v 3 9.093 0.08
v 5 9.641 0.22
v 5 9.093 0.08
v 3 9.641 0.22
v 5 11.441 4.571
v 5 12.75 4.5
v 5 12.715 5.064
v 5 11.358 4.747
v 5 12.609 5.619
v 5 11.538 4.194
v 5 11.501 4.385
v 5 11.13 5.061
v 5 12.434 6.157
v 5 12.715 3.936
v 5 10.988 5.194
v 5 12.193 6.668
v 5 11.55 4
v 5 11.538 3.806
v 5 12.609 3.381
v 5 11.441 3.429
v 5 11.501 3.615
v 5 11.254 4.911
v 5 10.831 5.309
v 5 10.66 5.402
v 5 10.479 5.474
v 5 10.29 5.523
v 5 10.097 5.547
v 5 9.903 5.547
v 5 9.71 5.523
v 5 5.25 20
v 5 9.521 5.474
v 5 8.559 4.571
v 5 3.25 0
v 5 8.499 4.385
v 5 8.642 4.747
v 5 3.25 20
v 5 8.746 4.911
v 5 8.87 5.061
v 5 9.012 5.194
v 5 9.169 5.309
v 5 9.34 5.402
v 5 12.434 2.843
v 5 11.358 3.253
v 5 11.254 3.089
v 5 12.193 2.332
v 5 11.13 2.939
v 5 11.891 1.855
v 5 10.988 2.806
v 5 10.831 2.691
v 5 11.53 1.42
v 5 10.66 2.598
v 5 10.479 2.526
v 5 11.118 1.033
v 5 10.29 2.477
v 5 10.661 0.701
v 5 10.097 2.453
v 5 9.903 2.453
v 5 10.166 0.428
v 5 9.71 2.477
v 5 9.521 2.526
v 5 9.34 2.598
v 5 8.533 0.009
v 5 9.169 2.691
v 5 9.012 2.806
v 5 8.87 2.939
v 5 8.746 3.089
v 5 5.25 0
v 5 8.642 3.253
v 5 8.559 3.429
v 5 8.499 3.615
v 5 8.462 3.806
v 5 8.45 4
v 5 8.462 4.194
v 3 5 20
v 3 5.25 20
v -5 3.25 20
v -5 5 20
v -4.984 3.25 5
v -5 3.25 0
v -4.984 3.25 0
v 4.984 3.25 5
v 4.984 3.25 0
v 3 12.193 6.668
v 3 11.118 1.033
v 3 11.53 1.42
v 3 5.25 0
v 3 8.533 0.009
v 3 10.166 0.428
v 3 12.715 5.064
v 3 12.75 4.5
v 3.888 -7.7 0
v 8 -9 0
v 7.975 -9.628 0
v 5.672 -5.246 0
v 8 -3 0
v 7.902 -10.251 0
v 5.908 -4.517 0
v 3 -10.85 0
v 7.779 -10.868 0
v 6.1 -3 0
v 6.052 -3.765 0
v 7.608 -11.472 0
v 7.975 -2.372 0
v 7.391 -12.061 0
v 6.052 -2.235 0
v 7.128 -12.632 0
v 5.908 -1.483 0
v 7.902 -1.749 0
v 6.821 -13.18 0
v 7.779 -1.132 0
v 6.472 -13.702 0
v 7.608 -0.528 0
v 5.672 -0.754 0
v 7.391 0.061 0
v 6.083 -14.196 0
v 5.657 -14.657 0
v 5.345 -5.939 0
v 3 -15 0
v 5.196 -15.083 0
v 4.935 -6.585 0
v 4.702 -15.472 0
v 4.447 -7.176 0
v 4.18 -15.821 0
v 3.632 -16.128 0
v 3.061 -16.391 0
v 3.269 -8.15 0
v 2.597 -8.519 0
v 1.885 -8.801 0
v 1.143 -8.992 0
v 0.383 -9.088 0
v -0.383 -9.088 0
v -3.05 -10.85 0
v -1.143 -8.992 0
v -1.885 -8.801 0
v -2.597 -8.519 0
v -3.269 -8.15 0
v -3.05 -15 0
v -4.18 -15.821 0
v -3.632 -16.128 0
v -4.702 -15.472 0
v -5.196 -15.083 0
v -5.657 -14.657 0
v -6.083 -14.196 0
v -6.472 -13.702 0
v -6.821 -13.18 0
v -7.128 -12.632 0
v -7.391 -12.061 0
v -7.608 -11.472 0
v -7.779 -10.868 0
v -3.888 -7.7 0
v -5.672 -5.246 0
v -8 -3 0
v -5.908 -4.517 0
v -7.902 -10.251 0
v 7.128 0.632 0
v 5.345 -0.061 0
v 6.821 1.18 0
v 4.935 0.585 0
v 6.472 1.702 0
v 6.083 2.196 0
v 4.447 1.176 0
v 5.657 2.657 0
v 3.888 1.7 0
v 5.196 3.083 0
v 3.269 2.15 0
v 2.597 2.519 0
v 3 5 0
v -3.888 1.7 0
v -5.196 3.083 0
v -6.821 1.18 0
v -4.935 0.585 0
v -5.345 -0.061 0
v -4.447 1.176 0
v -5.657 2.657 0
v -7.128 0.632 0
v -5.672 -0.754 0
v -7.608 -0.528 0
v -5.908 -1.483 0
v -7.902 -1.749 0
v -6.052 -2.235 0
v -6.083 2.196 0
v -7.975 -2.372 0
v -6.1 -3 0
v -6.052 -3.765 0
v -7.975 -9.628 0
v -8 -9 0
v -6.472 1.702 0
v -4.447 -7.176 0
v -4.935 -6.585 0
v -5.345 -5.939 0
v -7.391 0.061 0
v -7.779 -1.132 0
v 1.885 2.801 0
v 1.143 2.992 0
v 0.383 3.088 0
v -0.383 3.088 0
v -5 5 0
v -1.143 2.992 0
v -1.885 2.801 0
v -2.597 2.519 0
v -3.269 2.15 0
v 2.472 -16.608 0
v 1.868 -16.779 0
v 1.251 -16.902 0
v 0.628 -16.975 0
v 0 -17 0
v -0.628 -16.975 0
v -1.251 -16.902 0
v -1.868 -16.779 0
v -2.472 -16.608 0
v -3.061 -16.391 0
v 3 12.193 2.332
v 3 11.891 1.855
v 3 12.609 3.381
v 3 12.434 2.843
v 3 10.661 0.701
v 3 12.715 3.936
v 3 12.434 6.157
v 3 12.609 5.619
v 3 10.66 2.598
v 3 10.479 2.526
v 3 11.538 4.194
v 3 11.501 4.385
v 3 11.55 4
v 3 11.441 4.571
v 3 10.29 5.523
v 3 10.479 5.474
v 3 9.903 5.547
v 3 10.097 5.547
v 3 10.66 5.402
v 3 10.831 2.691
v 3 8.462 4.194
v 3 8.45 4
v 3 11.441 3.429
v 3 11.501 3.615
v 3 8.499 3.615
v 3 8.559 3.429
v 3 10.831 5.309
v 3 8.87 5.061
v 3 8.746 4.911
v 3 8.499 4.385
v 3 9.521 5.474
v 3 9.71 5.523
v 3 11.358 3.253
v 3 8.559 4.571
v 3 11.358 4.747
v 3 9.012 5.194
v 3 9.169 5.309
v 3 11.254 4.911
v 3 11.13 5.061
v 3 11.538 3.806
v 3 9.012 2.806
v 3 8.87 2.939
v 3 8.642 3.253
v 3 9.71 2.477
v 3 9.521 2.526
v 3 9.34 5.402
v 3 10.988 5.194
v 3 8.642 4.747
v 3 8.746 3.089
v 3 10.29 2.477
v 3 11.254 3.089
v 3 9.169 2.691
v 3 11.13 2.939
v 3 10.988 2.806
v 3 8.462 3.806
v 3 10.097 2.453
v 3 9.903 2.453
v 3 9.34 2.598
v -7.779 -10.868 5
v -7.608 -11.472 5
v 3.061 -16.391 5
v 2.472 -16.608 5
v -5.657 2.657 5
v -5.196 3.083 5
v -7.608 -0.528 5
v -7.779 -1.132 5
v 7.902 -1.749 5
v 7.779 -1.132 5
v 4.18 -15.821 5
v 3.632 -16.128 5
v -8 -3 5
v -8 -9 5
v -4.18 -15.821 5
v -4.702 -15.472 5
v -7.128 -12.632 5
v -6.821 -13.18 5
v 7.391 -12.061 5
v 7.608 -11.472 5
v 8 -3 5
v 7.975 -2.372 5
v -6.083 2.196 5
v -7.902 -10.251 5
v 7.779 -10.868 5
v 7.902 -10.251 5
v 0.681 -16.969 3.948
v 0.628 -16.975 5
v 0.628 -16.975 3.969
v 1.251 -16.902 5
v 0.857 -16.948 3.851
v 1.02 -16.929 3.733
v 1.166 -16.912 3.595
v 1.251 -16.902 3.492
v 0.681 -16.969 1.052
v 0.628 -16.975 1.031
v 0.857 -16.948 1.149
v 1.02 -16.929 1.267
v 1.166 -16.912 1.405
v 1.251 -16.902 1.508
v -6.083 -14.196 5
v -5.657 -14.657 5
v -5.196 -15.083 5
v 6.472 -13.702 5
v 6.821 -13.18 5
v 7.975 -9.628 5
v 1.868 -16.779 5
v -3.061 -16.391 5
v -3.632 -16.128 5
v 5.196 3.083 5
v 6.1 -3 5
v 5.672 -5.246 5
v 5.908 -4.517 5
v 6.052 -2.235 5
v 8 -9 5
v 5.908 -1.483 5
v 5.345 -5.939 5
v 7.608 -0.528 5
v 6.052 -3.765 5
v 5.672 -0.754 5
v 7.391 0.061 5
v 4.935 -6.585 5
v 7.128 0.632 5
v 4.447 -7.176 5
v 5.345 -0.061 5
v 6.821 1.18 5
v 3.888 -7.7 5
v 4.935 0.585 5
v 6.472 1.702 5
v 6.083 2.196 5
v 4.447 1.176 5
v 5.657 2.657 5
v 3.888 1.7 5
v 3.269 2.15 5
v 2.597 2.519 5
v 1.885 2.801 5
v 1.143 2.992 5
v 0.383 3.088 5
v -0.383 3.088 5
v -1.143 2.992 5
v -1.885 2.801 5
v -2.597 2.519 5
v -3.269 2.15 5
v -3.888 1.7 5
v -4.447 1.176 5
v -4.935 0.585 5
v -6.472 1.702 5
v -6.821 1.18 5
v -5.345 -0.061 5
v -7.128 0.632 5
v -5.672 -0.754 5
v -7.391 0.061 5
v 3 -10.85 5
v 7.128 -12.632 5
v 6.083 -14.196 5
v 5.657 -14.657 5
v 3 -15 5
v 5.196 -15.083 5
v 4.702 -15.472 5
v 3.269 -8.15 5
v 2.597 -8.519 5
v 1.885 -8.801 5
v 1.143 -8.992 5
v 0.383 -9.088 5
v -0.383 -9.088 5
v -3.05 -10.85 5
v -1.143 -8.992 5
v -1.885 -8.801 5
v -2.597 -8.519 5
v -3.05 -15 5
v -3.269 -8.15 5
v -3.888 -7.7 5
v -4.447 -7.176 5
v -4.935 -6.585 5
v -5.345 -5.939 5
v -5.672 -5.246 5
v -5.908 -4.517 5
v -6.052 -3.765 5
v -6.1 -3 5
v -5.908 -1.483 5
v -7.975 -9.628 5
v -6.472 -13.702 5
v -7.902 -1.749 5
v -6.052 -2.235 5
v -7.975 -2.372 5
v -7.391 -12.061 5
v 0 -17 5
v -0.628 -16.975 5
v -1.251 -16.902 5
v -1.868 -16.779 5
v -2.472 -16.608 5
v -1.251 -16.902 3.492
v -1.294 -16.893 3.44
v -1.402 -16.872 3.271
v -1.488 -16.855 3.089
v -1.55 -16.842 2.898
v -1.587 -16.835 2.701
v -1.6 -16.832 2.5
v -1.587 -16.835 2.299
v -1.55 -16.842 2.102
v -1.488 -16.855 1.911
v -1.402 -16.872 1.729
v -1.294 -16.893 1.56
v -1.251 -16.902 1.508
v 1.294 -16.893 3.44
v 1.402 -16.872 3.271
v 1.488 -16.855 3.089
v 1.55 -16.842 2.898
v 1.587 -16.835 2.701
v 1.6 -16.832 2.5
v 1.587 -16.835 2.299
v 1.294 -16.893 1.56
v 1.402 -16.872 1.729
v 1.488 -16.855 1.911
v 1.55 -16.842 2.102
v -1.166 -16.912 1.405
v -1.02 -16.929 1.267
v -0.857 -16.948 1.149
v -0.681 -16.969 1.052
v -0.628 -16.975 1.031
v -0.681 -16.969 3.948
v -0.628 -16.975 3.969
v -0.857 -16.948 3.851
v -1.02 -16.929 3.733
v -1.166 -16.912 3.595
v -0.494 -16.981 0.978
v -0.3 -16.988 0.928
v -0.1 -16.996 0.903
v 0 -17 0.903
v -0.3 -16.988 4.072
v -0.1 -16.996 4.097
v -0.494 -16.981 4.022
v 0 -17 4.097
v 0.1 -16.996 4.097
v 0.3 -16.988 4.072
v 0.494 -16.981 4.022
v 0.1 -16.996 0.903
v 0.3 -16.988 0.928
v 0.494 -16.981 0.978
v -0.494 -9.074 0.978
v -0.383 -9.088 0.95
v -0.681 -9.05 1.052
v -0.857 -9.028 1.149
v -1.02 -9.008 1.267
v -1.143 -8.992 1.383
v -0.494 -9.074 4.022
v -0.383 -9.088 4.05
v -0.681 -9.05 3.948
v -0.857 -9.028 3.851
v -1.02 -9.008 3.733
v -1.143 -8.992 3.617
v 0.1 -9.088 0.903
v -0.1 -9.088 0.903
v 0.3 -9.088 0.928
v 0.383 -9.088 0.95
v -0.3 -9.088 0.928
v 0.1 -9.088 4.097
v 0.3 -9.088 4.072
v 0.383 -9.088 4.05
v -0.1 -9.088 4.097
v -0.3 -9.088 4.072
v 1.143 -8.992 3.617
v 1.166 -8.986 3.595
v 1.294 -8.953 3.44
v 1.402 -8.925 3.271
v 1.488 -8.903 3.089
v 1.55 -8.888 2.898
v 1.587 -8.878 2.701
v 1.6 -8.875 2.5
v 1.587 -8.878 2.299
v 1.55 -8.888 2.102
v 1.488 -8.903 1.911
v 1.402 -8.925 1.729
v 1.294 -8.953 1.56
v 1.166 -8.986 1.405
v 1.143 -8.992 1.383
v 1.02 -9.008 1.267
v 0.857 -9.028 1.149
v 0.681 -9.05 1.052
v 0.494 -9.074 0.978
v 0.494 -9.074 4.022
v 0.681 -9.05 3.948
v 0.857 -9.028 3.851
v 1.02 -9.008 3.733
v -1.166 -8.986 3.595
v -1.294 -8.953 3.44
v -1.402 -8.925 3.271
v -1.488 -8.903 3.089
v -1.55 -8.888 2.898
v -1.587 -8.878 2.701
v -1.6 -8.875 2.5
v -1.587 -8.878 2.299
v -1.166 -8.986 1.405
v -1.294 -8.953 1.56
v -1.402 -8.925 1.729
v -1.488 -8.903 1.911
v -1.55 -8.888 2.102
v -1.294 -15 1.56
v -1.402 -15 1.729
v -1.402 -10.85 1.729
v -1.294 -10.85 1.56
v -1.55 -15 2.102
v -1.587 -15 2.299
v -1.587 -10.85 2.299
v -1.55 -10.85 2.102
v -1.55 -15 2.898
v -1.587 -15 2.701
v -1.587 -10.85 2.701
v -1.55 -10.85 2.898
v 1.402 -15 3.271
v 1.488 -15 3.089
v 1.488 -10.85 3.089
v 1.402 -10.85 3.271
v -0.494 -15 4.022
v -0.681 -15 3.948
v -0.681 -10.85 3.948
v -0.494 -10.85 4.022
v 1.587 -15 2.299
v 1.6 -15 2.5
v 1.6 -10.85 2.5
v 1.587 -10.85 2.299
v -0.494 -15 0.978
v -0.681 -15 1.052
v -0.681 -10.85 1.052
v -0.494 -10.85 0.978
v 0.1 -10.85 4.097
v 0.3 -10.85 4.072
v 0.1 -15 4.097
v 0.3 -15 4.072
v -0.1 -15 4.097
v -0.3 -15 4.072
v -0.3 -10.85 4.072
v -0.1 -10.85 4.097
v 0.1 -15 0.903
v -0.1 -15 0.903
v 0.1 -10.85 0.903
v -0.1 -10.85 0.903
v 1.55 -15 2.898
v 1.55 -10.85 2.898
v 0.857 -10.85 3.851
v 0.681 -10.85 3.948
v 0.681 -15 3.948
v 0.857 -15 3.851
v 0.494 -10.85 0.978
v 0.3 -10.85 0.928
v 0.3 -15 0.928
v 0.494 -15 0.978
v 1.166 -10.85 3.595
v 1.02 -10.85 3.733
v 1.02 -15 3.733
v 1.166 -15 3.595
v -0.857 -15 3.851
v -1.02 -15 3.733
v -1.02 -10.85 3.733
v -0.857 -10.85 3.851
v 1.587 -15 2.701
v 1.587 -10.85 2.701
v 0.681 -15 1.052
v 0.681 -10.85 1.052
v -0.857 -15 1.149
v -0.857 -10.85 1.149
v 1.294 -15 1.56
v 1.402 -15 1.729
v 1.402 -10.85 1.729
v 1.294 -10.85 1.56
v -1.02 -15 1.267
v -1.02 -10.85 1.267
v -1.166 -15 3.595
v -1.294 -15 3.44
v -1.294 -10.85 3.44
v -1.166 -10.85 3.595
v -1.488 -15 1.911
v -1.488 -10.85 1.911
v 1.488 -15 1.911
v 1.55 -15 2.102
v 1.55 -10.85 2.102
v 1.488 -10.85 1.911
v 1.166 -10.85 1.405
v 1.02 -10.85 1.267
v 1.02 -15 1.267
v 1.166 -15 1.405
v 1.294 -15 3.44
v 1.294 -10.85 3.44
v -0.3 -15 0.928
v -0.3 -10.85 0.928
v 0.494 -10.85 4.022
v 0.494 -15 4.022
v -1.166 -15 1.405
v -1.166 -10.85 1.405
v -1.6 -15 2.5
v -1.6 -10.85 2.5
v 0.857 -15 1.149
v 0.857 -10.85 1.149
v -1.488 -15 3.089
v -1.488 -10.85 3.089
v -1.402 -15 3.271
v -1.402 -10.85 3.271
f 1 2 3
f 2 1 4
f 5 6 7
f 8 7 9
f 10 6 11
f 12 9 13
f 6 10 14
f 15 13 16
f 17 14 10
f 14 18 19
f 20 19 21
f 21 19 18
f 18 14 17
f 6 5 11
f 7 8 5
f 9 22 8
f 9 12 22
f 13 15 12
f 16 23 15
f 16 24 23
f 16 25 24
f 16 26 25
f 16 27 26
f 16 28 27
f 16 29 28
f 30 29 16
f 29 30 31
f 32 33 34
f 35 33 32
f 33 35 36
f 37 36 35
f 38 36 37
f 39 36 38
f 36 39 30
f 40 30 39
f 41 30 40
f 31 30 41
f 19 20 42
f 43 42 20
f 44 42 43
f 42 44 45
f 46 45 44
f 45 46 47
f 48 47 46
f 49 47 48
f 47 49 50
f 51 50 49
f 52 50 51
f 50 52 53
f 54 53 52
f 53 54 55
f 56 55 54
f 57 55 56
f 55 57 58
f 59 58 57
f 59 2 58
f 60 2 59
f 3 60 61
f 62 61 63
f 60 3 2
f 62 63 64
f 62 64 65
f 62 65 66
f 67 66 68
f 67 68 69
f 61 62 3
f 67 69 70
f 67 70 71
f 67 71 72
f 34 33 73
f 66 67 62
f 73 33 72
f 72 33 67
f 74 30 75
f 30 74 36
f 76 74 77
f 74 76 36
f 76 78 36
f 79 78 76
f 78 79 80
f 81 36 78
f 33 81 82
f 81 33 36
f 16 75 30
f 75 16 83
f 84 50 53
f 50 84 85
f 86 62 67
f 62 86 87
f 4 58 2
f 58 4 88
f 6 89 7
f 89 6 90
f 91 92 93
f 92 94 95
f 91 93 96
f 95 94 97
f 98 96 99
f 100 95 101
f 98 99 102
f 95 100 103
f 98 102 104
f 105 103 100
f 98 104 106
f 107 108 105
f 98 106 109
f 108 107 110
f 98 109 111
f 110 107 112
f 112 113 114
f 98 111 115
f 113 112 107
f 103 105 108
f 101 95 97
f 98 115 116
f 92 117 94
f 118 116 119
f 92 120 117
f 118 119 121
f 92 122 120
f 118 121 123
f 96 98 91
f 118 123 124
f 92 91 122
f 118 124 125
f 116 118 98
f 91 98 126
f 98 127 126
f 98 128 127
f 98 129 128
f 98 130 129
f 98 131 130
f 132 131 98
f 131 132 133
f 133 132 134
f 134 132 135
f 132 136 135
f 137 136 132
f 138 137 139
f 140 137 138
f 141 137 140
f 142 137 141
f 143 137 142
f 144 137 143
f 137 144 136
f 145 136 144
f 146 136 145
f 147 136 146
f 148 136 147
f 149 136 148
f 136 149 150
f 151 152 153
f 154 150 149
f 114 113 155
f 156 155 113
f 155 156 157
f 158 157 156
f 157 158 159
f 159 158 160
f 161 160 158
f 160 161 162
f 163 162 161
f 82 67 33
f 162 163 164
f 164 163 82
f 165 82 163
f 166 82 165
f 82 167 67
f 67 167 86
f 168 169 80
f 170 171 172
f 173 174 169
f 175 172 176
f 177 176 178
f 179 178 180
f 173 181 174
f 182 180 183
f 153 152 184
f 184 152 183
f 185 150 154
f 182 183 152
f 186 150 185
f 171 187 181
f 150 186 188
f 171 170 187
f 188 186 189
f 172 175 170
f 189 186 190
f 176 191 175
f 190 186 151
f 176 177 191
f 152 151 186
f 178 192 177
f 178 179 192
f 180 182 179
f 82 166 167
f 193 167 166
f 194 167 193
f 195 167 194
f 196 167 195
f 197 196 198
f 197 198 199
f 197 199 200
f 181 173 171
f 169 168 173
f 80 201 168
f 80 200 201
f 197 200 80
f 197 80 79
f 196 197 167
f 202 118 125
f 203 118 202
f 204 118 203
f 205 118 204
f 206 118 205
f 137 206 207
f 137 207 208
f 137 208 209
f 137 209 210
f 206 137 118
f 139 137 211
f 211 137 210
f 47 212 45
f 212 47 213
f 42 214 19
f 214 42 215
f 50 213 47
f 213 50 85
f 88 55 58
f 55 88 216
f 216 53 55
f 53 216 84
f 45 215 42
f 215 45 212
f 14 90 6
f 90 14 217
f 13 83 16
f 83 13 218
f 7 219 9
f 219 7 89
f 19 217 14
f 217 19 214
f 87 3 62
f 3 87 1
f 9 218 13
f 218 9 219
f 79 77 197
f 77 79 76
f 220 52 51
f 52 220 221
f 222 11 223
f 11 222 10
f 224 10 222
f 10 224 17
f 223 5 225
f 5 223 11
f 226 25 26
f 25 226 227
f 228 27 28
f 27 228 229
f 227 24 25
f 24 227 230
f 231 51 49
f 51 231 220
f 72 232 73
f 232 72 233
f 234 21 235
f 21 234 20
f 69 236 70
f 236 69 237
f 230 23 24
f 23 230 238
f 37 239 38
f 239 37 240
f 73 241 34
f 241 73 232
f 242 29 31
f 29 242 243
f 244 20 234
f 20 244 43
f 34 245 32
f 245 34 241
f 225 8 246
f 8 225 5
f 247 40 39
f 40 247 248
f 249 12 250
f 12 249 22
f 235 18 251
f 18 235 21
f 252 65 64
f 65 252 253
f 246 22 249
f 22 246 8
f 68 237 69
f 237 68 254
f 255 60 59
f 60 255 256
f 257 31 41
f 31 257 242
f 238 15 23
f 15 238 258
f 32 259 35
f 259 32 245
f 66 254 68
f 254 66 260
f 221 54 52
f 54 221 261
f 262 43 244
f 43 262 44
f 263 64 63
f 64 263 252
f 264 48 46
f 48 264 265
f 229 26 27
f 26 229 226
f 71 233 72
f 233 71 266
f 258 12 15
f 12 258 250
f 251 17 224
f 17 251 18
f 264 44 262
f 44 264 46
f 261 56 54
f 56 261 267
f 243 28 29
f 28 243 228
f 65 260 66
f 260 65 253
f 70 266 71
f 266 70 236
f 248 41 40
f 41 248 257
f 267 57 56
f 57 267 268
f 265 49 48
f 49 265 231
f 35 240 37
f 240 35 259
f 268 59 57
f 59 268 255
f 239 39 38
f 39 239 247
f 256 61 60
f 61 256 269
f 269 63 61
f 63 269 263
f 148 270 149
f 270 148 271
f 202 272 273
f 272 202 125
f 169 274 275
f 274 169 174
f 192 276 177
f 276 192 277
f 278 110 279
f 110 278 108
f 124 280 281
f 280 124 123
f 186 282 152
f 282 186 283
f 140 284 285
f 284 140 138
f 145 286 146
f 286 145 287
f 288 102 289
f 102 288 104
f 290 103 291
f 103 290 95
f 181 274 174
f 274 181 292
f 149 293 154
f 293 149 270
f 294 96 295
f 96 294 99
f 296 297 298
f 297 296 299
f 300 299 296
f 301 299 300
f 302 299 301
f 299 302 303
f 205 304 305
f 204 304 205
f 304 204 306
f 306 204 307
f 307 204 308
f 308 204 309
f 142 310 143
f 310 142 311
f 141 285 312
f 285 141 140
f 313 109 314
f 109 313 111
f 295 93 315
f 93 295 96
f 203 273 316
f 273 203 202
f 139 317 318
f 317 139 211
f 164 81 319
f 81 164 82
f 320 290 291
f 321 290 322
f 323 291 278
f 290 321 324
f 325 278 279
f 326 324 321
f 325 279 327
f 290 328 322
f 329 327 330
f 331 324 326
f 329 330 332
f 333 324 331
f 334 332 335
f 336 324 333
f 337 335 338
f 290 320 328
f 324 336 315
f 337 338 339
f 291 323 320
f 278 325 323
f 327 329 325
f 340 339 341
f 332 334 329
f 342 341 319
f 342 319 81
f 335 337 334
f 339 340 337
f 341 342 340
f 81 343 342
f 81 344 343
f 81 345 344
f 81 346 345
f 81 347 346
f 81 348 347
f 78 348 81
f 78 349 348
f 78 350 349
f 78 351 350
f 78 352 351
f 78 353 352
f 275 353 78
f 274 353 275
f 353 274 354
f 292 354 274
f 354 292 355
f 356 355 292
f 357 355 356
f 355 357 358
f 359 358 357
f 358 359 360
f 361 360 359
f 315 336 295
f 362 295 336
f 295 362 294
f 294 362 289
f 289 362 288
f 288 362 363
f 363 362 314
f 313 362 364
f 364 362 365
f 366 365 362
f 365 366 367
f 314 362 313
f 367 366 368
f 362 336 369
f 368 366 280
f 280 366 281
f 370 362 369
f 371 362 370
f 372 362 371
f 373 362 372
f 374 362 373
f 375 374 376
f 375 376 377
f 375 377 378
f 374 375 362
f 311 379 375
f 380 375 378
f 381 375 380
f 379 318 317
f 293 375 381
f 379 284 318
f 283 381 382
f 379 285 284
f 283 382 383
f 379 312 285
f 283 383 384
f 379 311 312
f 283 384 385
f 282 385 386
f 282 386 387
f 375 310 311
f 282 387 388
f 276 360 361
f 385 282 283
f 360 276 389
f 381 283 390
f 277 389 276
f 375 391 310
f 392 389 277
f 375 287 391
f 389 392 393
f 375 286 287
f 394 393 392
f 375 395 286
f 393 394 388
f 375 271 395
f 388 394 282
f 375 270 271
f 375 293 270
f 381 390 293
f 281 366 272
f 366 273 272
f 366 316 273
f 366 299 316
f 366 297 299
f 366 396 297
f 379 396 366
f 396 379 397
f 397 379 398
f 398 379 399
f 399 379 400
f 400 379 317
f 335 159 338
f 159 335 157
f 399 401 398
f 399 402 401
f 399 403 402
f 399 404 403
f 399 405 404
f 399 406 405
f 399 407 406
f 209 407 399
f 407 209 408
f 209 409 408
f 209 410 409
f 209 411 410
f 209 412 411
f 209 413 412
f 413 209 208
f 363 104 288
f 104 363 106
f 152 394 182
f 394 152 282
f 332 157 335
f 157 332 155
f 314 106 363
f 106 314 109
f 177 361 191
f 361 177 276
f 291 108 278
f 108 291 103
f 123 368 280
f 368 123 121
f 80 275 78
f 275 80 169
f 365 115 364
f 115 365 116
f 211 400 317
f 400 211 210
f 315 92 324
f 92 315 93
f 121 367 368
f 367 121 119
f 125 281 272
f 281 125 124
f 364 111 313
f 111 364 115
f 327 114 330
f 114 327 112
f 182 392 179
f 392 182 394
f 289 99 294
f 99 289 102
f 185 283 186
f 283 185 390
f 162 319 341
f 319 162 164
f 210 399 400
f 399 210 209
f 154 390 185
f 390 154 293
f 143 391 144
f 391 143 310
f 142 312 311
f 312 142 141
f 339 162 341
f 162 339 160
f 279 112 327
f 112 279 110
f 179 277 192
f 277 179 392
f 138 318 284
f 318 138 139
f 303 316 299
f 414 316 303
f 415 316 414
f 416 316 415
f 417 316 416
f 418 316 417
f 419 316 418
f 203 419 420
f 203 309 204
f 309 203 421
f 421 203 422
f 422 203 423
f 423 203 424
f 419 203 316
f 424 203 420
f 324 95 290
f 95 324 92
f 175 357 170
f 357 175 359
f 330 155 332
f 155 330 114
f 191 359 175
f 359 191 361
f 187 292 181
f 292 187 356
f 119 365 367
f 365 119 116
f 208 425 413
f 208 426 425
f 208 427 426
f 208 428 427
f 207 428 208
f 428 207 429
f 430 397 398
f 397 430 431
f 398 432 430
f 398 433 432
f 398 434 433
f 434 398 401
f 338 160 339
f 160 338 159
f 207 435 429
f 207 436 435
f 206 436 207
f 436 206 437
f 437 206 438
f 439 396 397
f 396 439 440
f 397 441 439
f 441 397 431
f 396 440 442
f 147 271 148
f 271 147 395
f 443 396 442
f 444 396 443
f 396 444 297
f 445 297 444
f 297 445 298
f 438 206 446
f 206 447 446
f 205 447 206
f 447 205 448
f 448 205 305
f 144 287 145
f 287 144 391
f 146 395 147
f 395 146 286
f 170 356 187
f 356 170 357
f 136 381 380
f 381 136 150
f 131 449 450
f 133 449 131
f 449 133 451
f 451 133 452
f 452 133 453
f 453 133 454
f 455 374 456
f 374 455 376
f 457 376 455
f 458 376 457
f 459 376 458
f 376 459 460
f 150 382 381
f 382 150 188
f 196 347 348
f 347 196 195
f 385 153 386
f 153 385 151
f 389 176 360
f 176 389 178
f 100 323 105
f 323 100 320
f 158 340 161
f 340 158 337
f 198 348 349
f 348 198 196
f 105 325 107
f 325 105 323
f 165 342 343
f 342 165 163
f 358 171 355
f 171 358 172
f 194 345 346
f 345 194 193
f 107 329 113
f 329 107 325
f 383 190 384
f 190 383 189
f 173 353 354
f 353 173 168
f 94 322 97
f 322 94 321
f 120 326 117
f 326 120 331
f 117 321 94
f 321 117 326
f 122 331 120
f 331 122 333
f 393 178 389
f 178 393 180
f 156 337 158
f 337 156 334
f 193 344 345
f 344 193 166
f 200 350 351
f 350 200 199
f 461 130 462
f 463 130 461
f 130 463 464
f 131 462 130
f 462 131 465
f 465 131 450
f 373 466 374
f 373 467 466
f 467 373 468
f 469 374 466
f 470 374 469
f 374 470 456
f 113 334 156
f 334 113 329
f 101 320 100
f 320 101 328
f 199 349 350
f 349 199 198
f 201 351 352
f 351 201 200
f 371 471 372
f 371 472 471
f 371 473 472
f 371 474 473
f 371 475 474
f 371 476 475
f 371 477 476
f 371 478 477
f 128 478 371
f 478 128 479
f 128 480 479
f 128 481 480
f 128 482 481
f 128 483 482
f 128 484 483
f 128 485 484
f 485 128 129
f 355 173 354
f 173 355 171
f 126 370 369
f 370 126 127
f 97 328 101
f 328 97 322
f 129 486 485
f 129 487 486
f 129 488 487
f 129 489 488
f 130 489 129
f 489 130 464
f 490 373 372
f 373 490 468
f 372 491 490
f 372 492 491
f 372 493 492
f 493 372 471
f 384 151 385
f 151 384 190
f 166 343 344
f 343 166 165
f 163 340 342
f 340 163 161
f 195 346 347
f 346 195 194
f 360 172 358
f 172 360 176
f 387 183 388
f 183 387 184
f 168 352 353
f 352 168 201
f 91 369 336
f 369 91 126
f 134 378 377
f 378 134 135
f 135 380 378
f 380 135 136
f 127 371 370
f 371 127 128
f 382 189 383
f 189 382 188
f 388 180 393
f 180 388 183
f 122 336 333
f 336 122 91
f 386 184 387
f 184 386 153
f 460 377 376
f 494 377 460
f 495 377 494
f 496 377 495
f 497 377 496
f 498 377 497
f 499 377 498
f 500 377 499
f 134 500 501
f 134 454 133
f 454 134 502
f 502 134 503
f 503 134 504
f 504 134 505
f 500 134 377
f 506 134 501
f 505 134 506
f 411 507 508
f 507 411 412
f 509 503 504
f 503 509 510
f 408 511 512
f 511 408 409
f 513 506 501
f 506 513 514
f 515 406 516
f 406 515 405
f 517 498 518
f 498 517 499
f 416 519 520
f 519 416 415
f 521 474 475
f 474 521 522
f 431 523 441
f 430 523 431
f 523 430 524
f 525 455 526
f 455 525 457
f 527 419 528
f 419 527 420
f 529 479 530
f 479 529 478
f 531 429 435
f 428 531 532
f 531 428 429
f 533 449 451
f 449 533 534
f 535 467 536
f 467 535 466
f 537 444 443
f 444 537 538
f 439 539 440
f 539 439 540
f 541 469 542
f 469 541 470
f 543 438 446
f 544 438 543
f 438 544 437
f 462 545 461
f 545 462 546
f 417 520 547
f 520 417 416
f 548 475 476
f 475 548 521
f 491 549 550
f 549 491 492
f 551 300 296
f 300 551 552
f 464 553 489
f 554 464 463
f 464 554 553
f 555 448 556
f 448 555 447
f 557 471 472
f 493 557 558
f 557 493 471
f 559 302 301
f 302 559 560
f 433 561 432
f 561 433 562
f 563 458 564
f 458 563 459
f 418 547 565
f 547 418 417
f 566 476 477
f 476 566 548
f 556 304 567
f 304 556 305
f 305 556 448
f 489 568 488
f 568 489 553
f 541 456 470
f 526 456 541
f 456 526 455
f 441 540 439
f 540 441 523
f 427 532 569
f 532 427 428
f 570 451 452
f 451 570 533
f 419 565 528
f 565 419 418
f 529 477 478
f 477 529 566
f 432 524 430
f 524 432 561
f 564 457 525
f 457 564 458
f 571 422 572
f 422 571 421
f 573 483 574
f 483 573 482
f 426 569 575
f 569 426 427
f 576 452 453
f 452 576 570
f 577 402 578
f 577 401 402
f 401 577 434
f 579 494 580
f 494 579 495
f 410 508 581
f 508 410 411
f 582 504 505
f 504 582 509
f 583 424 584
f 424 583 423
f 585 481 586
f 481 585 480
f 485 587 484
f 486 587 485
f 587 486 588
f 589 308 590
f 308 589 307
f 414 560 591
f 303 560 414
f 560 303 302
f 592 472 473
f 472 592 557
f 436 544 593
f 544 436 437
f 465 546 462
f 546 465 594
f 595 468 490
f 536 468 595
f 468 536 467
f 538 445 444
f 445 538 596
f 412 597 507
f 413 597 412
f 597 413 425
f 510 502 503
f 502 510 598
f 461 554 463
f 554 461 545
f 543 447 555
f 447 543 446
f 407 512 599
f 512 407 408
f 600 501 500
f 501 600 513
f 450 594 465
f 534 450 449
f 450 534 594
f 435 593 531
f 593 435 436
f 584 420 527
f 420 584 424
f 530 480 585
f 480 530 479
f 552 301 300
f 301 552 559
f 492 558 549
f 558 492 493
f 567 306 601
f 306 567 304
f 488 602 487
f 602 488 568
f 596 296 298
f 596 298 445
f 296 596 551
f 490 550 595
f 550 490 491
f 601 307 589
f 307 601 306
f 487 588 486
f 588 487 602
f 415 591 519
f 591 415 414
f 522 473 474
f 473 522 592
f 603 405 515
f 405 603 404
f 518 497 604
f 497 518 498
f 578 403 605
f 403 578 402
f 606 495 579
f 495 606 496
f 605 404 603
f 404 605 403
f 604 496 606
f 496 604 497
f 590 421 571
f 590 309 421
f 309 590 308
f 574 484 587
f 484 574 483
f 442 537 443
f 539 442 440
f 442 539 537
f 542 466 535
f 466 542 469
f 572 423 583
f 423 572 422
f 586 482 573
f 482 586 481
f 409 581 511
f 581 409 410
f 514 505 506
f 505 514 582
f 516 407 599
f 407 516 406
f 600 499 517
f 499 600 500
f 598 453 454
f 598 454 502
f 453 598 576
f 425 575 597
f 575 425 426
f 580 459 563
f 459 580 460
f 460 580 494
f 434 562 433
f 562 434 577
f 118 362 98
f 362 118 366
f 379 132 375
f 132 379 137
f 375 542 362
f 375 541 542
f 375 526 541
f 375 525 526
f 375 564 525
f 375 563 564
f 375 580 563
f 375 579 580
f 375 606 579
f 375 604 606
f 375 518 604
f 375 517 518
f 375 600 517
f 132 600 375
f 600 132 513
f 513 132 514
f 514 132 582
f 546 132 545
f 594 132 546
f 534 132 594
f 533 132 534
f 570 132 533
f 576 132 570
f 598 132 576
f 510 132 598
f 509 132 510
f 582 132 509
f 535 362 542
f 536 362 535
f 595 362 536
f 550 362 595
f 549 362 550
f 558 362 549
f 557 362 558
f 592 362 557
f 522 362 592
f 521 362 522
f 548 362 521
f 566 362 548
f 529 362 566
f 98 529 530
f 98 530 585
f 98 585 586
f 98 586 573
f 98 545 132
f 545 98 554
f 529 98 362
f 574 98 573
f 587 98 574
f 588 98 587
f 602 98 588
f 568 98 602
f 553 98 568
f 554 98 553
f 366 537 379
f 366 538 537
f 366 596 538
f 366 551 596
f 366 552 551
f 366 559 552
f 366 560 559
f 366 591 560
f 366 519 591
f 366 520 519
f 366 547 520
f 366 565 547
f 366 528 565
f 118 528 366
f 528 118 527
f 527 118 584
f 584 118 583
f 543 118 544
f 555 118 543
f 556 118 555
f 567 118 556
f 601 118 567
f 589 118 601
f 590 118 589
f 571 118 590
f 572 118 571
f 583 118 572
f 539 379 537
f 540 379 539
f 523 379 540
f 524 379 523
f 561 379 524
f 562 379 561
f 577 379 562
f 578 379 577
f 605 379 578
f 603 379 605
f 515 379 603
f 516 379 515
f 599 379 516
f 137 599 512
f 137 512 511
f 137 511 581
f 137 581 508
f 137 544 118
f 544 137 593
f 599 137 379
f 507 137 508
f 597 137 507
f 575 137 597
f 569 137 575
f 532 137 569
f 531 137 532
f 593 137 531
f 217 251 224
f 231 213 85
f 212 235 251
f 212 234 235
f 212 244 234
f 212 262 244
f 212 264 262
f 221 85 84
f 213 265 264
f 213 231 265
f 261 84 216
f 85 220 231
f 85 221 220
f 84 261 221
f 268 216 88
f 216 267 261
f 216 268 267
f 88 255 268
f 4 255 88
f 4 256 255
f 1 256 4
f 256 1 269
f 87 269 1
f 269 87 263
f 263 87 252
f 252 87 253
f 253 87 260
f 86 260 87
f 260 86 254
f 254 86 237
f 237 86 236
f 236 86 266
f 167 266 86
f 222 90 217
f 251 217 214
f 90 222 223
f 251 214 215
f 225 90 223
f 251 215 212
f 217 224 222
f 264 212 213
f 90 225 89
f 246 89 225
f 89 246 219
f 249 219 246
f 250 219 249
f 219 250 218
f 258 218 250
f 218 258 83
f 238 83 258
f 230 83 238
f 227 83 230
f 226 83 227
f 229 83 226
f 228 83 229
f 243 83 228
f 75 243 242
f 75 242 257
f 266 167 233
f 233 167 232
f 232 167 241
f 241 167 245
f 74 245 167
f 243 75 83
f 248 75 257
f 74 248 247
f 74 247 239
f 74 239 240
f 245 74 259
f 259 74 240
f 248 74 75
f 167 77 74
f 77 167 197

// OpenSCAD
module casquillo_jhead(){
	difference(){
		union(){
			cylinder(h=5.9, r=2.5, $fn=6);
			cylinder(h=0.9, r=5, $fn=50);
		}
		translate([0,0,-2])cylinder(h=10, r=1.1, $fn=20);
	}
}


module fan_holder(){

	difference(){
		union(){
			translate([-12,0,0])cube([24,10,10]);
			translate([-20,-4,0])cube([40,4,10]);
		}
		
		translate([0,-5,5])rotate([-90,0,0])union(){
			translate([-7.5,0,0])cylinder(h=20, r=1.55, $fn=30);
			translate([7.5,0,0])cylinder(h=20, r=1.55, $fn=30);
		
			translate([-7.5,0,0])cylinder(h=8, r=2.55, $fn=50);
			translate([7.5,0,0])cylinder(h=8, r=2.55, $fn=50);
	
			translate([-7.5,0,8])cylinder(h=1.2, r1=2.55, r2=1.55, $fn=50);
			translate([7.5,0,8])cylinder(h=1.2, r1=2.55, r2=1.55, $fn=50);
	
			translate([-16,0,0])cylinder(h=10, r=1.55, $fn=30);
			translate([16,0,0])cylinder(h=10, r=1.55, $fn=30);
	
			translate([-16,0,2])rotate([0,0,30])cylinder(h=15, r=3.1, $fn=6);
			translate([16,0,2])rotate([0,0,30])cylinder(h=15, r=3.1, $fn=6);
	
			//color("pink")translate([-15,-20,0])cube([30,20,30]);
		}
	}
}


module portainductivo(metrica=12){

offset = metrica==12 ? 1.25 : 1.35;

difference(){
	union(){
		translate([2,6,-1])rotate([0,0,90])difference(){
		
				translate([-2.75,7,1])rotate([90,0,0])
					hull(){
						translate([5,4.5,0])cylinder(h=10, r=4.5, $fn=50);
						translate([0,0,0])cube([2,20,10]);
					}
				translate([4,2,5])rotate([90,0,0])
					cylinder(h=15, r=1.55, $fn=50);
		}
		difference(){
			translate([0,-metrica/4,0])hull(){
				cylinder(h=5, r=(metrica/2)+2, $fn=80);
				translate([0,-metrica/2,0])
					cylinder(h=5, r=(metrica/2)+2, $fn=80);
			}
		
			translate([0,-metrica/4,-3])
				cylinder(h=15, r=(metrica/2)+0.1, $fn=50);
			translate([0,0,2.5])rotate([90,0,0])
				cylinder(h=25, r=1.6, $fn=50);
			#translate([-3.05,-offset*metrica,-3])cube([6.05,4.15,10]);
		}
	}
	translate([-17,5,-5])cube([20,20,40]);
	}
}


// -----------------------------------

//color("pink")casquillo_jhead();

//rotate([90,0,0])color("red")fan_holder();

portainductivo();
